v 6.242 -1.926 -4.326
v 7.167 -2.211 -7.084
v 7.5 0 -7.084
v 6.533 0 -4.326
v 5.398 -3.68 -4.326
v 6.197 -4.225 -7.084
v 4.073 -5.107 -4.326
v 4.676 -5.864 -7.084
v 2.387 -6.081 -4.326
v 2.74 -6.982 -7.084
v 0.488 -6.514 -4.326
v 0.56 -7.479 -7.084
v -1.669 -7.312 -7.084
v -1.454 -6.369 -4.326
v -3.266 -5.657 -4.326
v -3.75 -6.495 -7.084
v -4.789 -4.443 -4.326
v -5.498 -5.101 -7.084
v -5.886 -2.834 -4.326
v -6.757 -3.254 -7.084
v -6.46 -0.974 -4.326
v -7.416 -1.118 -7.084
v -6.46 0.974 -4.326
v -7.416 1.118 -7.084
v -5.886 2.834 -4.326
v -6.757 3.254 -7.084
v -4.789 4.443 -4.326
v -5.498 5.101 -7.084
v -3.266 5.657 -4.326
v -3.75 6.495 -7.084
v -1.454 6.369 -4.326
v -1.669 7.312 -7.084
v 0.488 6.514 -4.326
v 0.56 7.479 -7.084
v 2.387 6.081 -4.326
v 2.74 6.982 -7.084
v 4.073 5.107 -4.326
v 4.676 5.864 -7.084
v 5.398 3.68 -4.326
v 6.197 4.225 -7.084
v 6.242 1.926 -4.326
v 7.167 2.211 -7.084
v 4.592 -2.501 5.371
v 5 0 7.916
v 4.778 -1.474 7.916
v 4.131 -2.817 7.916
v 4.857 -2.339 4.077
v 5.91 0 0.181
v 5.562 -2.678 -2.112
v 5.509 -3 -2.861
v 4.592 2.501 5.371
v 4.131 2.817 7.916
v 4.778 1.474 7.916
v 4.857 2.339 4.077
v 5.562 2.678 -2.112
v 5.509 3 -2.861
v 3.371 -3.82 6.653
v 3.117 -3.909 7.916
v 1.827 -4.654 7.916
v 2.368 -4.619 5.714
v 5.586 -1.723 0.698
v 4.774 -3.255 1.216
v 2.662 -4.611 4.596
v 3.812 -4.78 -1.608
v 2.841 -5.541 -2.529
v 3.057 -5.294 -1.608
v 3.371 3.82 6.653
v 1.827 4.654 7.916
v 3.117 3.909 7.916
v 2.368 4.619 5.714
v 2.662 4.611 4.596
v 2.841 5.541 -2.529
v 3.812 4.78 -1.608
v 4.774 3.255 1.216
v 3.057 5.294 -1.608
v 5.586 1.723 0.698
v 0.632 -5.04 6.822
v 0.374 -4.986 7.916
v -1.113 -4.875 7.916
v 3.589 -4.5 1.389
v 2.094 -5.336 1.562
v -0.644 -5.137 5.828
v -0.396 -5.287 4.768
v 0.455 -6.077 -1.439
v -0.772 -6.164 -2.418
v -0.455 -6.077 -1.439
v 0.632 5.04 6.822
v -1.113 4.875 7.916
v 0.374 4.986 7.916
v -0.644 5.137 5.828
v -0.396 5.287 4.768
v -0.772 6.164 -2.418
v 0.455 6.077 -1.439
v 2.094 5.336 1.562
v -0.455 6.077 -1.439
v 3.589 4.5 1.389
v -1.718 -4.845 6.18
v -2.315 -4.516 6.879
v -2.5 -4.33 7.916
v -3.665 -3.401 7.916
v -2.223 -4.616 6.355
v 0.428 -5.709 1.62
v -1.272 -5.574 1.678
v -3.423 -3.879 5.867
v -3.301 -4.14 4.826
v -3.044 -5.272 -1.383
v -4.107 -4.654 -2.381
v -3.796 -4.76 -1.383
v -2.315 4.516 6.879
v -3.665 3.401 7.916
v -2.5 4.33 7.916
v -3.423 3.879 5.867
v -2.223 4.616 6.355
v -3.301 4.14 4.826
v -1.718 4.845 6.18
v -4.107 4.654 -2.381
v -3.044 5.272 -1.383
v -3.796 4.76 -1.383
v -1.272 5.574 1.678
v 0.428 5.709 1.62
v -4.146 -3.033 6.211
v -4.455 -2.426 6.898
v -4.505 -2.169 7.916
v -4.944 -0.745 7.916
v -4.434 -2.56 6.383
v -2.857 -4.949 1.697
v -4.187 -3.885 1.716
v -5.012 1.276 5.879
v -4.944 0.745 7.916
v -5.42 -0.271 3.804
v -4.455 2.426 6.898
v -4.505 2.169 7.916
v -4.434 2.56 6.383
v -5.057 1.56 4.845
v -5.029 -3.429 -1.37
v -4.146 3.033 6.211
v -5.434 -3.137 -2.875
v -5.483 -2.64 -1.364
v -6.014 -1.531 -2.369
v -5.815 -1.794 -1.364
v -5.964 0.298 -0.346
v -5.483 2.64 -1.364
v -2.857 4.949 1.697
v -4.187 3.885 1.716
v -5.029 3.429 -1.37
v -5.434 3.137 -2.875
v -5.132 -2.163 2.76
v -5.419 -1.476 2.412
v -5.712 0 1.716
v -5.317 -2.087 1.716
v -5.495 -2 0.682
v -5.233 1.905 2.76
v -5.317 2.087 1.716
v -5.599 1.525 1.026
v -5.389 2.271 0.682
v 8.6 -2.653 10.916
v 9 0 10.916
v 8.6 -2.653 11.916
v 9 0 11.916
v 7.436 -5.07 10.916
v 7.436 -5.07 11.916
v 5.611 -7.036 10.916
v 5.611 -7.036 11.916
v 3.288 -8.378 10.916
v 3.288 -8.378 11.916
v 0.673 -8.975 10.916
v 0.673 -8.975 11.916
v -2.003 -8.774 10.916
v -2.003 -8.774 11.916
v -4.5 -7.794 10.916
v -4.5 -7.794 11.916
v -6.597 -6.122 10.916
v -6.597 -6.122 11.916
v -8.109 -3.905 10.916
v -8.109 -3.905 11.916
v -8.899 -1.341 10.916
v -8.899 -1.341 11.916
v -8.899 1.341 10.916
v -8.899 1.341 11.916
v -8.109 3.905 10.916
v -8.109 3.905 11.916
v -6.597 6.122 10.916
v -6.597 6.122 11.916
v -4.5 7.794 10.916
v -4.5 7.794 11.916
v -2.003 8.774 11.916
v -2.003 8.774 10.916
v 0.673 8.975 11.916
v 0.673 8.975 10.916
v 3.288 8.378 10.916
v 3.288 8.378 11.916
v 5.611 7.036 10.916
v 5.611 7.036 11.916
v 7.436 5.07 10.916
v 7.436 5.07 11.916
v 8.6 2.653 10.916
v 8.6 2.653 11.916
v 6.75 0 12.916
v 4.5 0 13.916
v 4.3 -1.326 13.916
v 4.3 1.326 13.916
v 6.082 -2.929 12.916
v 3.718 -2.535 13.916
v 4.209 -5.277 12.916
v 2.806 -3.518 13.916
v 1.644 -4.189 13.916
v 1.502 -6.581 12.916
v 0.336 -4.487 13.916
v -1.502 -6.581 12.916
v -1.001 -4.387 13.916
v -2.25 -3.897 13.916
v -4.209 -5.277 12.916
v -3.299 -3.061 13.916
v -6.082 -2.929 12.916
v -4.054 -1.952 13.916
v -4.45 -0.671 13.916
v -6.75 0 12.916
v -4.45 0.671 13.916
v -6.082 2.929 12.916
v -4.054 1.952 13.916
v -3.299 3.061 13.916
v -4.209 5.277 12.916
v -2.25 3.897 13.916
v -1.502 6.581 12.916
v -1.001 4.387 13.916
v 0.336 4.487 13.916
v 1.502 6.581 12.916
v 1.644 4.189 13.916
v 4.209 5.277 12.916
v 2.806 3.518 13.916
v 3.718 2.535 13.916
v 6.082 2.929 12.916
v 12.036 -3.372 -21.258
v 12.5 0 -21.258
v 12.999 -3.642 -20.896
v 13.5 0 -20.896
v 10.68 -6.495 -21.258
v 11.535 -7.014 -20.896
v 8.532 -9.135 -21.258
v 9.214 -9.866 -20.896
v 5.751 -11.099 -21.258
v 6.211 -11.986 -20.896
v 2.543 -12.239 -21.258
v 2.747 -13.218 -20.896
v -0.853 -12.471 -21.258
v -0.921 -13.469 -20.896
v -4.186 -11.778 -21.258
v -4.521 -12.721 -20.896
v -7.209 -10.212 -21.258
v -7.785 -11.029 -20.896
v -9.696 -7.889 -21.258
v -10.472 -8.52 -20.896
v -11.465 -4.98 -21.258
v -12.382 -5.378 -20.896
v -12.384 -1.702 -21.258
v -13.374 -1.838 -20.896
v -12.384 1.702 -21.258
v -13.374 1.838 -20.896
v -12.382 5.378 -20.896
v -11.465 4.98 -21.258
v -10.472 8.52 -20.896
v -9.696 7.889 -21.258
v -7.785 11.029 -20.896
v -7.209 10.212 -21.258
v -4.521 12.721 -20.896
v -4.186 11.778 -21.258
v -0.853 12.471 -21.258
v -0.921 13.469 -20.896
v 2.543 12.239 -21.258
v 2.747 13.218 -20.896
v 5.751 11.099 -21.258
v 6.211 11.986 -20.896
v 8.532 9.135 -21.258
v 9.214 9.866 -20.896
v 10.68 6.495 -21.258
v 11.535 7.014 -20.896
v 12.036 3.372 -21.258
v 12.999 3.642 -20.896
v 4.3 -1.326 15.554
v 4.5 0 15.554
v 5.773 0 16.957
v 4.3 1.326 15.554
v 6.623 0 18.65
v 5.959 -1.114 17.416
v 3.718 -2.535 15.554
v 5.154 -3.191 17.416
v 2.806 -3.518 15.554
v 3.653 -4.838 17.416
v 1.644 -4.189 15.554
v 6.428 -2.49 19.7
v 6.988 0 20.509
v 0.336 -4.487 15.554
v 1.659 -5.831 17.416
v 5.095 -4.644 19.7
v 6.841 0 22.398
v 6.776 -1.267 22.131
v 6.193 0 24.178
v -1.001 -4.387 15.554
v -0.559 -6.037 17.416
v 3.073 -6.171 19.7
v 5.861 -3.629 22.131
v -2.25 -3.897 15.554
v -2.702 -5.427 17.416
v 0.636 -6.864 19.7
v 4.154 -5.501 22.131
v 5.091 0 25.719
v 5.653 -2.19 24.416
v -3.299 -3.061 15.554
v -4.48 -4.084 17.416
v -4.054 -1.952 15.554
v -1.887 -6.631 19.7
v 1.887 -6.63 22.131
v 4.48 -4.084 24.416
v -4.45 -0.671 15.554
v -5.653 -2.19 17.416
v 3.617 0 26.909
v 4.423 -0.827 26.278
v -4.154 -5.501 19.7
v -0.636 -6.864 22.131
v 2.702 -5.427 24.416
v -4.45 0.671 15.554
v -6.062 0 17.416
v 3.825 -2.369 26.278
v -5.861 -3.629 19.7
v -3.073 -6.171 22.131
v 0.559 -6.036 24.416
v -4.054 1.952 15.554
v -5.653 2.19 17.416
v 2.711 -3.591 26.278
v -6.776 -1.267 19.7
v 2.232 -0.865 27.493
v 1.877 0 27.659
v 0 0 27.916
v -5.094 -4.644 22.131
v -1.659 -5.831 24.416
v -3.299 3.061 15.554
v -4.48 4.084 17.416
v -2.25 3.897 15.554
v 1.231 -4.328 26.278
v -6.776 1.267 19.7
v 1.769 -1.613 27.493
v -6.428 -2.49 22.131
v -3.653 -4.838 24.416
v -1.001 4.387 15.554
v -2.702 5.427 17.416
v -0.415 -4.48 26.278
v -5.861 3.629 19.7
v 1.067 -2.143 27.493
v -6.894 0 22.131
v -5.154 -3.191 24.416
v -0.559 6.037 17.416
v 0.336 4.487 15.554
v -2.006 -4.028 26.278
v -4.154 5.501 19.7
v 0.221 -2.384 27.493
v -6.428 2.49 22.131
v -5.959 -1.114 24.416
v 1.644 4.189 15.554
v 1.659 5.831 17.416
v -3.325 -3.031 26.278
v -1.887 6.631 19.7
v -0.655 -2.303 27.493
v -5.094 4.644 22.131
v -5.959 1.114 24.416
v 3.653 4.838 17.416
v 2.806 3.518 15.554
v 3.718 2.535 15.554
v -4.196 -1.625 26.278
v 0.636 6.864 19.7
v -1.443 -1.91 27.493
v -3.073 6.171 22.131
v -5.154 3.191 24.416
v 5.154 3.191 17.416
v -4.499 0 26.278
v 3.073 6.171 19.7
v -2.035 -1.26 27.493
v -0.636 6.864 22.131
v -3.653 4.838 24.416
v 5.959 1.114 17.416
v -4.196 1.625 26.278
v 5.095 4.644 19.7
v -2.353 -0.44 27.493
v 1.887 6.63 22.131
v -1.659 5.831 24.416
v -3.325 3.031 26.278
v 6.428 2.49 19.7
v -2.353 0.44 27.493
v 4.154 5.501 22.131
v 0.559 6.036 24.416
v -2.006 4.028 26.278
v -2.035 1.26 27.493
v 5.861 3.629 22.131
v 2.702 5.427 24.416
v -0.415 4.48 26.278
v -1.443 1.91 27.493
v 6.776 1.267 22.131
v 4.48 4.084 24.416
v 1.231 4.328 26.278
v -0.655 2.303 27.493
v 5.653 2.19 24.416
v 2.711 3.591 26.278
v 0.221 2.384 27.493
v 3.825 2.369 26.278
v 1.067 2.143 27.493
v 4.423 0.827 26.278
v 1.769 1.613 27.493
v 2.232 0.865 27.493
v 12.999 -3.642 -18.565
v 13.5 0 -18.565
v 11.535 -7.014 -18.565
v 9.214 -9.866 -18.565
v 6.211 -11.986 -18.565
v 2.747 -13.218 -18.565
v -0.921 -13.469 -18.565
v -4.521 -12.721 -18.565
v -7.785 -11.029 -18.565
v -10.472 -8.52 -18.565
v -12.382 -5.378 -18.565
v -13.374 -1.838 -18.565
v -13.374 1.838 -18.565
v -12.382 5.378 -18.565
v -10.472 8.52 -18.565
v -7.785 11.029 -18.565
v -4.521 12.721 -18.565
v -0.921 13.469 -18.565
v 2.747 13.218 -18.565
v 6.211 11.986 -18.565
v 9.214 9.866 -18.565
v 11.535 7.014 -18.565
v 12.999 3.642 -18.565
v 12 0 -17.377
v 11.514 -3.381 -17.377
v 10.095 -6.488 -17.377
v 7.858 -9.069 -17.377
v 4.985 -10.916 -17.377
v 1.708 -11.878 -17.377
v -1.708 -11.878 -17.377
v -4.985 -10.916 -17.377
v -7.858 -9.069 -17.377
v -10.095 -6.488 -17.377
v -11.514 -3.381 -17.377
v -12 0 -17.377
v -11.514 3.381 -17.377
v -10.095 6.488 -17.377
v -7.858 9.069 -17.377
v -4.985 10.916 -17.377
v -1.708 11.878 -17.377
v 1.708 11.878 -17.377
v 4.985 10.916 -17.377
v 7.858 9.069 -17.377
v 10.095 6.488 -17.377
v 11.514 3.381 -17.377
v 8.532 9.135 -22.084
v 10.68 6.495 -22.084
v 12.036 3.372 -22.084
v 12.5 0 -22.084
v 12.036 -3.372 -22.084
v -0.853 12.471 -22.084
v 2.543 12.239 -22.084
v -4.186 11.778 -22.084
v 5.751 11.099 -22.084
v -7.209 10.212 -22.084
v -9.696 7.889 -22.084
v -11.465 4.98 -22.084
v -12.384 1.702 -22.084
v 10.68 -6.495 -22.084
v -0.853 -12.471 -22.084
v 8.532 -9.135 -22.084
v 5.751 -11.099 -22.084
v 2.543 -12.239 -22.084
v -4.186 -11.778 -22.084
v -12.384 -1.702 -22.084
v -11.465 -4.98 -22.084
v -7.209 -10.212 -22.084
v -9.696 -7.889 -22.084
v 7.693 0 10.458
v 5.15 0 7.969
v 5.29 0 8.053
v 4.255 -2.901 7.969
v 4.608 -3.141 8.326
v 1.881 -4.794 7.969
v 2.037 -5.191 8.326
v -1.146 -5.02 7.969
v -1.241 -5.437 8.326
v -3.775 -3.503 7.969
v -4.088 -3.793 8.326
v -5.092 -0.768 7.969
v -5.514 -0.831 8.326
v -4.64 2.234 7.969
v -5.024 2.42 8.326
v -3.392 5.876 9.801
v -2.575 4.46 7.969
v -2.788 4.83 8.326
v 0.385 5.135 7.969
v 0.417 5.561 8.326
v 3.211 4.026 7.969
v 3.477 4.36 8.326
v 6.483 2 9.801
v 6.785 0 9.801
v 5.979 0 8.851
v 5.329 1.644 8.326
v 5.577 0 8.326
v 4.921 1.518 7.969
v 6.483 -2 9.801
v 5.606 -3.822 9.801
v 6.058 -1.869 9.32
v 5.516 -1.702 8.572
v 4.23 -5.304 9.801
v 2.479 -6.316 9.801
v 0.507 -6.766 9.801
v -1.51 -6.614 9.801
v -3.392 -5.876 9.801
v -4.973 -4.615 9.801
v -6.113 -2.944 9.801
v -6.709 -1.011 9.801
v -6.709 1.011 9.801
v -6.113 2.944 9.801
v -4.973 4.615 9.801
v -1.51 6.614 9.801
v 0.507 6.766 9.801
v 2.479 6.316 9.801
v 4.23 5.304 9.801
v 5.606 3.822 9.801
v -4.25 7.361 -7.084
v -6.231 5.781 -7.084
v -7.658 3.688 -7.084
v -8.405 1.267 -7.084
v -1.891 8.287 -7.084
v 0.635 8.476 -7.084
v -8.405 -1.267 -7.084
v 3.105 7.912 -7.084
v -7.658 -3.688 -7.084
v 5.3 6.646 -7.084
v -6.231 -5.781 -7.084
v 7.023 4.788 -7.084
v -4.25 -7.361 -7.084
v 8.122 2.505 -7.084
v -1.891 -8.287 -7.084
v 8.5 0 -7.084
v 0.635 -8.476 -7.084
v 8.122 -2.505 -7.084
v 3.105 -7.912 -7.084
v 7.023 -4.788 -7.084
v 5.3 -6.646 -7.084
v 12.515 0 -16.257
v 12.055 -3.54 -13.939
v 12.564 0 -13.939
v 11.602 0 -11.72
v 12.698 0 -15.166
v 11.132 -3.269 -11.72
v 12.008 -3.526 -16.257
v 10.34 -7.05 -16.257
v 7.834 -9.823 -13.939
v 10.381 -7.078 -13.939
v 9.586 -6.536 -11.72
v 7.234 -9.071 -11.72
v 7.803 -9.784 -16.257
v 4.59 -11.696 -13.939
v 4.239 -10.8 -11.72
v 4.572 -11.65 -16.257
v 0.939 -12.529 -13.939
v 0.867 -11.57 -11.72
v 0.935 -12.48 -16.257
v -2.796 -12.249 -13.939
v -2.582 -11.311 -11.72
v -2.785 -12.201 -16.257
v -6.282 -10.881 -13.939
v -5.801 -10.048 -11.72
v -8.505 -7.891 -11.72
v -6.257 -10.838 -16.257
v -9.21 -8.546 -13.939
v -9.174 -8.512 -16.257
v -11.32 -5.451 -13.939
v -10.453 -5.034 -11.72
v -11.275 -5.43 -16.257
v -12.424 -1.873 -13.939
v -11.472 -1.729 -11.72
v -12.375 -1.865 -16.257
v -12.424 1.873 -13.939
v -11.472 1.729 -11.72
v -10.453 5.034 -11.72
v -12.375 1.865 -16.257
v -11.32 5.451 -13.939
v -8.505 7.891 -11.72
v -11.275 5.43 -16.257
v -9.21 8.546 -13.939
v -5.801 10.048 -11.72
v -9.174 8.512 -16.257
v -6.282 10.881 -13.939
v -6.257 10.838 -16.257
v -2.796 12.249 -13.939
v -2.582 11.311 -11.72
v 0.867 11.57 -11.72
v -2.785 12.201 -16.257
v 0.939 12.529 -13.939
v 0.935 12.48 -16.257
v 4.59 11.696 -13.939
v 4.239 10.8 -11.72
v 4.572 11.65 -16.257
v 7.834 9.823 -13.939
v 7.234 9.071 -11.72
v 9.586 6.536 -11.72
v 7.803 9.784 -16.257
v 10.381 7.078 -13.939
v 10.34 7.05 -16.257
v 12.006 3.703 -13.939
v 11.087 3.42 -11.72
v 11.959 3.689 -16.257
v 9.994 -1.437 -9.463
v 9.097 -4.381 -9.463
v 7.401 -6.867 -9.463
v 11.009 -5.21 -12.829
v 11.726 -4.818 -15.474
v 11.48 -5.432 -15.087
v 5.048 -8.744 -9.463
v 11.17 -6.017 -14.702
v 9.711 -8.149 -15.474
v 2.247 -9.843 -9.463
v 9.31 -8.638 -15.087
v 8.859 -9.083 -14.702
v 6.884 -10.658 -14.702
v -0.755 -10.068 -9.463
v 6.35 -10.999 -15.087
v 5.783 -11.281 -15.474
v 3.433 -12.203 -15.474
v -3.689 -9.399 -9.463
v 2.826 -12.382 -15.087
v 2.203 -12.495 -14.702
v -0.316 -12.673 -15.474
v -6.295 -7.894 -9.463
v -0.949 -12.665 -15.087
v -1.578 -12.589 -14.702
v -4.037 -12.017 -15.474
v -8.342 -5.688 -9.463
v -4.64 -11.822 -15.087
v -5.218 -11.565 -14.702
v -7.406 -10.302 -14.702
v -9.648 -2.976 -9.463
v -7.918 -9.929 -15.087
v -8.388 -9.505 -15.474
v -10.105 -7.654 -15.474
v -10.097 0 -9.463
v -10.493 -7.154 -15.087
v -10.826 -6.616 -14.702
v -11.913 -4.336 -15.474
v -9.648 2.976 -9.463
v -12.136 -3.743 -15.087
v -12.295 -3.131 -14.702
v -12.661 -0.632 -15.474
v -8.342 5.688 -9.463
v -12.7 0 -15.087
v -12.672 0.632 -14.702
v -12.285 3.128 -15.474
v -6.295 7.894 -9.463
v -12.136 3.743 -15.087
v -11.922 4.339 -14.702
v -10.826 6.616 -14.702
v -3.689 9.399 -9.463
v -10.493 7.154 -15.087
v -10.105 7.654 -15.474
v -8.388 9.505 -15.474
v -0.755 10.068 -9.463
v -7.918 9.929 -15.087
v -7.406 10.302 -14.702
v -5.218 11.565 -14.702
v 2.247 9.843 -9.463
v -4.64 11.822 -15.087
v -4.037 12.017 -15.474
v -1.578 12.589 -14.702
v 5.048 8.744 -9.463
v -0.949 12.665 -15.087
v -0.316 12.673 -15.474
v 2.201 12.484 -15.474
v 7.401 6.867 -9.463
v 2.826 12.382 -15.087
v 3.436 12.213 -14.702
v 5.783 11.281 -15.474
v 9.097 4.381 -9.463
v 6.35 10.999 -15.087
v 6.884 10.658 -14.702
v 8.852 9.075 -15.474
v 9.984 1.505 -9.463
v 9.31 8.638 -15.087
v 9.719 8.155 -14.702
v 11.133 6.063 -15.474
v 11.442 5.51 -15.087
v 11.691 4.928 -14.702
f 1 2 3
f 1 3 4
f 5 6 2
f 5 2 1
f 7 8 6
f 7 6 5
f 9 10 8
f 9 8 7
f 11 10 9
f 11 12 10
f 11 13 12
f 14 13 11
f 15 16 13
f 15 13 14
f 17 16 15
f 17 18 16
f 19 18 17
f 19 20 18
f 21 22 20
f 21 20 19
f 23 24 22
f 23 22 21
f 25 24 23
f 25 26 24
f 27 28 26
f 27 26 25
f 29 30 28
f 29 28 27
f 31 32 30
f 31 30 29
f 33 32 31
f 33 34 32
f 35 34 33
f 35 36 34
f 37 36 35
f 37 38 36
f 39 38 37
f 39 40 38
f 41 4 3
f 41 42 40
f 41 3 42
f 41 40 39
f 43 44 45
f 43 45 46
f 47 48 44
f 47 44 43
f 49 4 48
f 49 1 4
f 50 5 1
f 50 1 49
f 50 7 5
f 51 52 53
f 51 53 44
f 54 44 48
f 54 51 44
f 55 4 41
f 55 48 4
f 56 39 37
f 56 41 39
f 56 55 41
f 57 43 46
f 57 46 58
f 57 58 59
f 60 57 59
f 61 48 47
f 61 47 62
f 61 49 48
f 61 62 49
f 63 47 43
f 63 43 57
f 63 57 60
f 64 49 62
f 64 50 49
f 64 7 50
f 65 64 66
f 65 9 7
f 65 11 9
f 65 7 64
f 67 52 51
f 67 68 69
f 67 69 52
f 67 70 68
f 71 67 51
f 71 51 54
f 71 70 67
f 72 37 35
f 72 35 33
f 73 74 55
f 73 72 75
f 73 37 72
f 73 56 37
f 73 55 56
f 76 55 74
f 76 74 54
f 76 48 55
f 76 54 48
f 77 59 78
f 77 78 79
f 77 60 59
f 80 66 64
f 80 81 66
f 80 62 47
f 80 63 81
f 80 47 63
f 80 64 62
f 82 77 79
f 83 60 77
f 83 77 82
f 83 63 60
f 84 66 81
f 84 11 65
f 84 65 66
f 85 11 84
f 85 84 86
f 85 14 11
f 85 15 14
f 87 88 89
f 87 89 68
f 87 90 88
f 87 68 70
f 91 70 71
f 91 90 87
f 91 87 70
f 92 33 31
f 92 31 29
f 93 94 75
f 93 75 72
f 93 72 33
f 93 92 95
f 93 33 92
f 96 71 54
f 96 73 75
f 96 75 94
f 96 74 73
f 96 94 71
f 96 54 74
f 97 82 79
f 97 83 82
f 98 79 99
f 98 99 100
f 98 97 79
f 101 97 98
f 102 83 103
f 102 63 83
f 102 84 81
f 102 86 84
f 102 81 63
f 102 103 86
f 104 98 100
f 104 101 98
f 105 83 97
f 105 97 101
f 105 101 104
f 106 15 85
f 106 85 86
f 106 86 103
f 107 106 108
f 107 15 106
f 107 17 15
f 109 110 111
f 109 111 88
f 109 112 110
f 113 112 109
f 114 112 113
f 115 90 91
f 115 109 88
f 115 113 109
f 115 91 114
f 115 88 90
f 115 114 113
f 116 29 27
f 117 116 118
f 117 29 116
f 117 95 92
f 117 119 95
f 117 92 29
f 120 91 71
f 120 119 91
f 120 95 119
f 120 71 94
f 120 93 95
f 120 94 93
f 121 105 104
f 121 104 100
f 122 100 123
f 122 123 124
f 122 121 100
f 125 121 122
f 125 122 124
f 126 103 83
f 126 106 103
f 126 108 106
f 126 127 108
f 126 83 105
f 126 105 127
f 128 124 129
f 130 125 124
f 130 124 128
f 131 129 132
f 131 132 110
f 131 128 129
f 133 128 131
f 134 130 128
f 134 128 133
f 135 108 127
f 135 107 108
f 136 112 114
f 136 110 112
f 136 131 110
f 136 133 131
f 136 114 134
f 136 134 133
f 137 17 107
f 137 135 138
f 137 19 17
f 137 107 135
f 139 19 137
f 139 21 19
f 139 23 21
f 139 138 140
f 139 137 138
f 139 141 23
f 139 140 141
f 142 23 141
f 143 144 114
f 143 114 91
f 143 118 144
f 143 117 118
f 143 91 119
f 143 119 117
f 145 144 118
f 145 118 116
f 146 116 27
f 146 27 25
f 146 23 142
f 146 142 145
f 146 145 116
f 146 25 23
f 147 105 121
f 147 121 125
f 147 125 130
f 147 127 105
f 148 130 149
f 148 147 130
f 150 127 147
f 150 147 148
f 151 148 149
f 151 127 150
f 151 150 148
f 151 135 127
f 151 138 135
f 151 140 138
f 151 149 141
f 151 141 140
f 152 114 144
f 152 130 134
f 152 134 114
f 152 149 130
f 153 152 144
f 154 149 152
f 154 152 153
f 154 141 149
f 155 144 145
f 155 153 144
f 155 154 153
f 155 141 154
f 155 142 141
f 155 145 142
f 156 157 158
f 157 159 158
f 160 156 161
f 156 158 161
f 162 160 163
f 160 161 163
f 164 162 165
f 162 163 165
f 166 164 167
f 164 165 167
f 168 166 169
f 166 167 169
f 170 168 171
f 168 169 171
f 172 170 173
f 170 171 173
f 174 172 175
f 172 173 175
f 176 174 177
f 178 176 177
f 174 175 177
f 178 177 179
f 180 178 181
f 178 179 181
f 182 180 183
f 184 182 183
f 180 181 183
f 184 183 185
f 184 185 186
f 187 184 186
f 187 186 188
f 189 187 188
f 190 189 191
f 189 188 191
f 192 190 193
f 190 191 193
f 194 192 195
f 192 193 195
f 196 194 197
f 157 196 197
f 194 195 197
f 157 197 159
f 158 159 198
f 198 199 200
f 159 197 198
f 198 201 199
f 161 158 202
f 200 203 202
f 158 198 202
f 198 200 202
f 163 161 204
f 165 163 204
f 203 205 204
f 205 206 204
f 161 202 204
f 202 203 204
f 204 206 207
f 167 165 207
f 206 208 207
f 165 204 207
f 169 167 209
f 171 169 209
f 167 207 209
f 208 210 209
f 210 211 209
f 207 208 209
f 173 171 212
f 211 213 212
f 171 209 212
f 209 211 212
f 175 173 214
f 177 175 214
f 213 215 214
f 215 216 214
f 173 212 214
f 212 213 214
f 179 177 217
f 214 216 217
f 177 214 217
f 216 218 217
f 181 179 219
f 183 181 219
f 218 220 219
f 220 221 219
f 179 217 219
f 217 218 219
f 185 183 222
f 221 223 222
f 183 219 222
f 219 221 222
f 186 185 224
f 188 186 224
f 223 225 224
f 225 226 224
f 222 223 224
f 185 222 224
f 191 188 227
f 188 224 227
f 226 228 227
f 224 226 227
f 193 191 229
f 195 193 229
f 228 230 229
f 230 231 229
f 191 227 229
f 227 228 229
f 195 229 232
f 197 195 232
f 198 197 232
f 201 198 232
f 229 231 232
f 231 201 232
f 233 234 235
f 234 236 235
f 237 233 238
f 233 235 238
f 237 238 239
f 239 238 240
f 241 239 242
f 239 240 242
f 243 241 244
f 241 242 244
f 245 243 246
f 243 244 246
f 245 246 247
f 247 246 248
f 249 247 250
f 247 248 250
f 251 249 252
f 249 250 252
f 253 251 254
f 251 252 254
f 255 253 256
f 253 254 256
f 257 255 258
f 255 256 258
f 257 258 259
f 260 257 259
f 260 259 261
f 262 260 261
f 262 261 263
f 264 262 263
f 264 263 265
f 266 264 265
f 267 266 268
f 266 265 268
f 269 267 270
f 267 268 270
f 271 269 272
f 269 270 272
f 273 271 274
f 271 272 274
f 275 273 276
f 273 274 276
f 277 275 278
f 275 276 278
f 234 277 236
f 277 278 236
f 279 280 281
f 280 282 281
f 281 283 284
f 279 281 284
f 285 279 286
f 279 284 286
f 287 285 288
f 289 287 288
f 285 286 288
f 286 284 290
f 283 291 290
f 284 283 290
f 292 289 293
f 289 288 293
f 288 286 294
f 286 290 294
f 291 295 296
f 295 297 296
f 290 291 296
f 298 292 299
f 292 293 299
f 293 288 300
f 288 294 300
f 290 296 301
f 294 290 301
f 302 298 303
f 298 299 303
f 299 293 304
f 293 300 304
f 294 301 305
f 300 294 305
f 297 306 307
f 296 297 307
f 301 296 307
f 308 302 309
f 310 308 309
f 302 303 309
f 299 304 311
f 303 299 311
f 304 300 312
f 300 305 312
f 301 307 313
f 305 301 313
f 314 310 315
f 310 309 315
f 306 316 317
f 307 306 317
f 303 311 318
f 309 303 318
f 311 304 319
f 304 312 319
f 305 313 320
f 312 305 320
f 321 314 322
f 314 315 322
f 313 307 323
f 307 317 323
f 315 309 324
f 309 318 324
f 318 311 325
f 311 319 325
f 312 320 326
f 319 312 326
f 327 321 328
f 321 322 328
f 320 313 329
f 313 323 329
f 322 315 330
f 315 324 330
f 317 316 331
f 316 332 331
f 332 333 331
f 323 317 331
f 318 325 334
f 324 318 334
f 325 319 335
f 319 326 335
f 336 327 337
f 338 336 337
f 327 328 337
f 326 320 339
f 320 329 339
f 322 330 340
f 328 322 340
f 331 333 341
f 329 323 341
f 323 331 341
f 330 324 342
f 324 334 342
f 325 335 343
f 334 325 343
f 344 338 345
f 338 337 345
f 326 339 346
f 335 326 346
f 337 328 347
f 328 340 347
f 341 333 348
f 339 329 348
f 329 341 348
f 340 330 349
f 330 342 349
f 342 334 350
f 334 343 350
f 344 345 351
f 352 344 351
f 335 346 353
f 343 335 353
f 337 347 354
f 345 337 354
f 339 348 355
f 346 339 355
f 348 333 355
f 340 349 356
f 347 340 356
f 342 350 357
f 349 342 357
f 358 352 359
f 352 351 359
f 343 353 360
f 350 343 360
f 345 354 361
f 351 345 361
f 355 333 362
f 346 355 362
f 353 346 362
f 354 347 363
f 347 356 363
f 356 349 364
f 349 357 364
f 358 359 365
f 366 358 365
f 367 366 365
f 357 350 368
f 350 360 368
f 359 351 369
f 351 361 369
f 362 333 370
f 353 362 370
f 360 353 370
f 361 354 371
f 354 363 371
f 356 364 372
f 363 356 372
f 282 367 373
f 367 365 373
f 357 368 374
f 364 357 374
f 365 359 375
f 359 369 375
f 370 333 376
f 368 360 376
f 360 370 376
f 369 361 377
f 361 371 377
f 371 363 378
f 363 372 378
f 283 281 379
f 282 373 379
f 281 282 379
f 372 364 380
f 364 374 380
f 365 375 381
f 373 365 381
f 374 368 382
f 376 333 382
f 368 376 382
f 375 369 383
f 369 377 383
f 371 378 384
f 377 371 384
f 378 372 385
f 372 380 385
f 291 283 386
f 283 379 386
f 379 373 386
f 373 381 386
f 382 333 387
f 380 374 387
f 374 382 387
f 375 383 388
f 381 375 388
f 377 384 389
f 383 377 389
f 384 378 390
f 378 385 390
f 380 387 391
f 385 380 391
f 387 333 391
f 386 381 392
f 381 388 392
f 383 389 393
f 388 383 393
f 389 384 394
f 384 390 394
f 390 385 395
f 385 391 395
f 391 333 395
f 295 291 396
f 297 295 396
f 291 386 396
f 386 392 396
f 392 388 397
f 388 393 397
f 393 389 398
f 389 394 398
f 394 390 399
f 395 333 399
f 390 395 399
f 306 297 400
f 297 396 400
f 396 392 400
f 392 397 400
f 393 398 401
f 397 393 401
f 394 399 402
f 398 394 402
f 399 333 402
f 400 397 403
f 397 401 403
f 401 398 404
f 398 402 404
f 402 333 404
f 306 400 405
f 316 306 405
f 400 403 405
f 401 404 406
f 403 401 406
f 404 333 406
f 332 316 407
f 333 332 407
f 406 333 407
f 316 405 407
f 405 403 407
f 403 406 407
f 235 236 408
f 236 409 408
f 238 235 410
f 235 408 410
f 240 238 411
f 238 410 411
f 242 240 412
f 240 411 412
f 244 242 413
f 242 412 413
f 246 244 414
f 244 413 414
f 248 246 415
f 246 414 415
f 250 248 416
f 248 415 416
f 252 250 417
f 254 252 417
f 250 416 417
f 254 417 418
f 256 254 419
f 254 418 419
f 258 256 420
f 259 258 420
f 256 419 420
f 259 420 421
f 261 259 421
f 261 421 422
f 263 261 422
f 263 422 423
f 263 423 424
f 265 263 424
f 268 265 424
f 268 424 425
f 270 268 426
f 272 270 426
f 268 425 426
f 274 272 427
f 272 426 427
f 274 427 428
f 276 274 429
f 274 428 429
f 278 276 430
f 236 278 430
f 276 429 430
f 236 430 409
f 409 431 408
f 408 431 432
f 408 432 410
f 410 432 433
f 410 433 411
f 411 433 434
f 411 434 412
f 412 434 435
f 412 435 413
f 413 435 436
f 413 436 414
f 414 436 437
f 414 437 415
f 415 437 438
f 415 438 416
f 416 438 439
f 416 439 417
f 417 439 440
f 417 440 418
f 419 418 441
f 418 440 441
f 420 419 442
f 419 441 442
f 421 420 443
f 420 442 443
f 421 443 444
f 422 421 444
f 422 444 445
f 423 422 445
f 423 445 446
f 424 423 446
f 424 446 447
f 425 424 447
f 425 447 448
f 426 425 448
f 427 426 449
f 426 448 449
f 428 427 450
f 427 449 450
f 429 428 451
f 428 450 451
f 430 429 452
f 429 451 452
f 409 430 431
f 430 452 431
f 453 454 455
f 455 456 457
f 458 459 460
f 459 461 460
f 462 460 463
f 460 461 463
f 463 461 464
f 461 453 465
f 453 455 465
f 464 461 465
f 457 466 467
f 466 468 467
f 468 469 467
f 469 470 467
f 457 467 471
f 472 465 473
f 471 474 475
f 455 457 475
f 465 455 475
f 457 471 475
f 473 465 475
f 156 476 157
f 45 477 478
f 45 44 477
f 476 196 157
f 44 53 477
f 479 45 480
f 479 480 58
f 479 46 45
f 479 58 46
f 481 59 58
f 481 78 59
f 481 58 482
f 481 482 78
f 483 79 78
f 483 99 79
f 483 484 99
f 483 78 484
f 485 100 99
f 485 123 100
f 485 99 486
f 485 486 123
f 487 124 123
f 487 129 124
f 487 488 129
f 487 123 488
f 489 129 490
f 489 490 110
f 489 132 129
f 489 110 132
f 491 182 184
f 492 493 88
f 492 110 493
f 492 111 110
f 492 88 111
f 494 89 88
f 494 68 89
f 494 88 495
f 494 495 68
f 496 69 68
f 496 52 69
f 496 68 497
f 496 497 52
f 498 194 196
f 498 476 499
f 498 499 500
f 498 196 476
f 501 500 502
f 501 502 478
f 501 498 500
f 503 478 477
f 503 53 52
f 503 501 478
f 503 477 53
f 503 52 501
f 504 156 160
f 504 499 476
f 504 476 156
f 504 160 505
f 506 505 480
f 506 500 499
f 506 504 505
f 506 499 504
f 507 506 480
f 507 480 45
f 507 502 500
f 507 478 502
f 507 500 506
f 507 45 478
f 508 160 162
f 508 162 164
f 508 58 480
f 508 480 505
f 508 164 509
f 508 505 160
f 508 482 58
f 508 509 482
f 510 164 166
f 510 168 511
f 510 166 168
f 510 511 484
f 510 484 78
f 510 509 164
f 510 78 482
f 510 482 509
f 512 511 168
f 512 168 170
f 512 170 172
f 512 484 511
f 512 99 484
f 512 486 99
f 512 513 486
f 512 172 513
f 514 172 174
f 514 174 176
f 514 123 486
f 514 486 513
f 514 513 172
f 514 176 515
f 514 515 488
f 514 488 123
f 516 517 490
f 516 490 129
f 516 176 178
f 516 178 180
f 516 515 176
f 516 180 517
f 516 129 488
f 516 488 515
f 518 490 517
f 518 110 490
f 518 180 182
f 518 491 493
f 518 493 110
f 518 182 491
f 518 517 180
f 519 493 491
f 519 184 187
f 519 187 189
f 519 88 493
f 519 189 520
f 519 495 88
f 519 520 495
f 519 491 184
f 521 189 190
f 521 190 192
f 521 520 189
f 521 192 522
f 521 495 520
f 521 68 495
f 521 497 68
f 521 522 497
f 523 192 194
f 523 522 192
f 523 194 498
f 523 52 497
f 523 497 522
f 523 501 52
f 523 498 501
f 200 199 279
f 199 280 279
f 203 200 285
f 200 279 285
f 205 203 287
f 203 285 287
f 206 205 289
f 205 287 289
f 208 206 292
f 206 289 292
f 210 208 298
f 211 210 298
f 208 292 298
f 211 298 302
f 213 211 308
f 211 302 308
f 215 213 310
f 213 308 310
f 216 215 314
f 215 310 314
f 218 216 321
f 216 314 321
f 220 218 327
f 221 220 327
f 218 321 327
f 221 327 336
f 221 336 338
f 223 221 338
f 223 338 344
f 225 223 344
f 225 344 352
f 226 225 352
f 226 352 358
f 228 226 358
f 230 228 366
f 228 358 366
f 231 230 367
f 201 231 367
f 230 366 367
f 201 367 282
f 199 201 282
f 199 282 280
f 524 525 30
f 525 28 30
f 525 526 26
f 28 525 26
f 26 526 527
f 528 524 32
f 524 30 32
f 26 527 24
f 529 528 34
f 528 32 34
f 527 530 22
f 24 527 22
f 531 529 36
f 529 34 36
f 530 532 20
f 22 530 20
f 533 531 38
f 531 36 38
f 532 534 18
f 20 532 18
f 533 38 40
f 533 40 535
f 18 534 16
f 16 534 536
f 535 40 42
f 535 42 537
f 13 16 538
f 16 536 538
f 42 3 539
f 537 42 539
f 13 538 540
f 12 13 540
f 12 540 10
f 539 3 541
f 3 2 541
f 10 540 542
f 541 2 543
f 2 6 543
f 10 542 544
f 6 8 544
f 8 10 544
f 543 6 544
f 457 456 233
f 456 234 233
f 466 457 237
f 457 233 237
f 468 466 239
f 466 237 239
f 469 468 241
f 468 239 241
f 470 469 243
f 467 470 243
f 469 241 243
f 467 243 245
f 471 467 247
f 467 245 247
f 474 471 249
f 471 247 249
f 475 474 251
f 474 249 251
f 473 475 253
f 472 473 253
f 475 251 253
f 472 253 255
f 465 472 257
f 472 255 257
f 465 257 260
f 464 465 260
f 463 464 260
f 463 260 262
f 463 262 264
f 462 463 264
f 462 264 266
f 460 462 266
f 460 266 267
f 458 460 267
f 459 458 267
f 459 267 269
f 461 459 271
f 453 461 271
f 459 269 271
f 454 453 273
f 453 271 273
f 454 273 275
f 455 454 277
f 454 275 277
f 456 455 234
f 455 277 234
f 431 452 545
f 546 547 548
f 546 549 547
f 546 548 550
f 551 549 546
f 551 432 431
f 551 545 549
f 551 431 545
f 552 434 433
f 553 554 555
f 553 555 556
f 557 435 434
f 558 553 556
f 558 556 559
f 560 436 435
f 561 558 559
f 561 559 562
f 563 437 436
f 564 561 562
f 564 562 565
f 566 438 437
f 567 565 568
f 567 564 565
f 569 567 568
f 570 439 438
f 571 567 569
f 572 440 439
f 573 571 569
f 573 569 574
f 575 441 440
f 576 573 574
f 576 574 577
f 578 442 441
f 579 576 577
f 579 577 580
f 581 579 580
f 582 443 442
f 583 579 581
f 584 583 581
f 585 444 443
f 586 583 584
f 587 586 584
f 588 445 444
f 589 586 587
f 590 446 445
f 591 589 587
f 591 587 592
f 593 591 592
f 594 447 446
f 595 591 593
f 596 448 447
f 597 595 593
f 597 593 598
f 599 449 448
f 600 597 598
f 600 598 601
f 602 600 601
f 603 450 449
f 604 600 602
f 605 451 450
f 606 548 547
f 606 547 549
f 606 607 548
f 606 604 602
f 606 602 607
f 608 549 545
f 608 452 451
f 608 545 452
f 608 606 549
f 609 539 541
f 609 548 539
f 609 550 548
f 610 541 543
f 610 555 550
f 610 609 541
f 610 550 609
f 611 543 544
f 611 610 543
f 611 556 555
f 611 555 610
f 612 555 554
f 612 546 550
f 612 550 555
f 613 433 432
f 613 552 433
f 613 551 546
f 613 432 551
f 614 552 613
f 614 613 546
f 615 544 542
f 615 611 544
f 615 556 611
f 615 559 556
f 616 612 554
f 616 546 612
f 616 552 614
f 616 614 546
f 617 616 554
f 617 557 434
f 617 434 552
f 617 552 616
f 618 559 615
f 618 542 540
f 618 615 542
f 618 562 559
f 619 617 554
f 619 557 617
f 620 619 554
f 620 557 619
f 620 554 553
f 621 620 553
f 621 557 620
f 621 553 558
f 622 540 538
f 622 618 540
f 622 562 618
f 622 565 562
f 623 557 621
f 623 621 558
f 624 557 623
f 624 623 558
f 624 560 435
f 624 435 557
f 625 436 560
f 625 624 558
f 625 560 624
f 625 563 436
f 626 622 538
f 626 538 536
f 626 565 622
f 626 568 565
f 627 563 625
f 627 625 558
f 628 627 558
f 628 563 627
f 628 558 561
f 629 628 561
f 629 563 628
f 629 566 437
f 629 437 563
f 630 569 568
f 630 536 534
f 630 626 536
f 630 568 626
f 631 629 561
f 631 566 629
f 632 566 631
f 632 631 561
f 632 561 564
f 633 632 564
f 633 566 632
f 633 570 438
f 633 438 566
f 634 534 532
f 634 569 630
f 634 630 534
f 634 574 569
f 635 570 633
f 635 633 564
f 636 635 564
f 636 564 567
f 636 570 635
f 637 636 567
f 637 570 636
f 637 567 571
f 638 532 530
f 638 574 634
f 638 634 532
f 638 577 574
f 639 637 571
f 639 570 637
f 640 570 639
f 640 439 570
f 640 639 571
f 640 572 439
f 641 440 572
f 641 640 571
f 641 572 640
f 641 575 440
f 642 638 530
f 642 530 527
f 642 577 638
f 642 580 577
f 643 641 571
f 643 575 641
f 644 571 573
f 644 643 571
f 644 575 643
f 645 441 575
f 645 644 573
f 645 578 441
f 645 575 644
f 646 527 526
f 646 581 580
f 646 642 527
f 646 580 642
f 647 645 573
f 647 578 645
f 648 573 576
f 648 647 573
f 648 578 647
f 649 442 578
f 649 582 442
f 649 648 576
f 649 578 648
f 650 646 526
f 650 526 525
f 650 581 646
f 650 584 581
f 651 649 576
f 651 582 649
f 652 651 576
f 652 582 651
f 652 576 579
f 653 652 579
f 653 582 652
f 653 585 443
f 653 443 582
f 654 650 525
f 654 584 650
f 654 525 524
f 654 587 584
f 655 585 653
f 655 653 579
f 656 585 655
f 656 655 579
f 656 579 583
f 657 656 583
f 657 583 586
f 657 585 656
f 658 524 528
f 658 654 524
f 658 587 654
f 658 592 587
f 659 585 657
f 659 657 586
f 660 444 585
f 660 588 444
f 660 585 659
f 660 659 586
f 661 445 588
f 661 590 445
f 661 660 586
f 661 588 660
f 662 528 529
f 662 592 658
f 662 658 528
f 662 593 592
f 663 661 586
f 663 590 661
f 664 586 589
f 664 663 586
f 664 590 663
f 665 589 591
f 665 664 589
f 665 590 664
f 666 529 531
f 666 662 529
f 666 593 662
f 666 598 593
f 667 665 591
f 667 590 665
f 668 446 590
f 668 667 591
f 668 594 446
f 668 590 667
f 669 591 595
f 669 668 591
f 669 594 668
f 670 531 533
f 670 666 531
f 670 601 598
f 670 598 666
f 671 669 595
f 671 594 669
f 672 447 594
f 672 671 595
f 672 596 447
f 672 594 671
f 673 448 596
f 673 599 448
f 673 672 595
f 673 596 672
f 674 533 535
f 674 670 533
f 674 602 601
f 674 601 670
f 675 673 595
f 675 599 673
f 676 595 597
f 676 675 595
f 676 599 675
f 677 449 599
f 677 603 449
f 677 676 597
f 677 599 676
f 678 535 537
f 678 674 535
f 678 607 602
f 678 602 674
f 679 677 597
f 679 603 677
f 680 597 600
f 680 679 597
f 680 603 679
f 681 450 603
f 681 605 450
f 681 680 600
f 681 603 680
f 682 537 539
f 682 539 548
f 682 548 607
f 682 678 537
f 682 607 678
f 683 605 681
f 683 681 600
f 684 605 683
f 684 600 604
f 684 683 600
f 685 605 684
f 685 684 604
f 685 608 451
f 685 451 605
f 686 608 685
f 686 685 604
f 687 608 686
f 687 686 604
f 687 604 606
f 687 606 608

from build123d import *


with BuildPart() as f1:
    # F0 (on Front) → F1 (revolve)
    with BuildSketch(Plane.XZ):
        with BuildLine():
            Line((4.5, 13.9155603797), (4.5, 15.5536577323))
            ThreePointArc((4.5, 15.5536577323), (6.5777396776, 23.3099999246), (0, 27.9155603797))
            Line((0, 27.9155603797), (0, -22.0844396203))
            Line((0, -22.0844396203), (12.5, -22.0844396203))
            Line((12.5, -22.0844396203), (12.5, -21.258339414))
            Line((12.5, -21.258339414), (13.5, -20.8962321129))
            Line((13.5, -20.8962321129), (13.5, -18.5651669636))
            Line((13.5, -18.5651669636), (12, -17.3774305589))
            add(Edge.make_bspline(
                [(8.5, -7.0844396203), (10.73704627, -10.7839351066), (14.1928188384, -13.7953361232), (12, -17.3774305589)],
                knots=[0, 0, 0, 0, 10.8717828557, 10.8717828557, 10.8717828557, 10.8717828557], degree=3))
            Line((8.5, -7.0844396203), (7.5, -7.0844396203))
            add(Edge.make_bspline(
                [(5, 7.9155603797), (5.1438804512, 5.3541886707), (6.0746159311, 0.04016457), (6.3753383304, -4.9510663585), (7.5, -7.0844396203)],
                knots=[0, 0, 0, 0, 0.5117325866, 1, 1, 1, 1], degree=3))
            add(Edge.make_bspline(
                [(9, 10.9155603797), (6.2072066026, 10.353216024), (5.9701752265, 8.1485969333), (5, 7.9155603797)],
                knots=[0, 0, 0, 0, 5, 5, 5, 5], degree=3))
            Line((9, 10.9155603797), (9, 11.9155603797))
            Line((9, 11.9155603797), (4.5, 13.9155603797))
        make_face()
    revolve(axis=Axis((0, 0, 5.2160786271), (0, 0, -1)))


solid = f1.part
